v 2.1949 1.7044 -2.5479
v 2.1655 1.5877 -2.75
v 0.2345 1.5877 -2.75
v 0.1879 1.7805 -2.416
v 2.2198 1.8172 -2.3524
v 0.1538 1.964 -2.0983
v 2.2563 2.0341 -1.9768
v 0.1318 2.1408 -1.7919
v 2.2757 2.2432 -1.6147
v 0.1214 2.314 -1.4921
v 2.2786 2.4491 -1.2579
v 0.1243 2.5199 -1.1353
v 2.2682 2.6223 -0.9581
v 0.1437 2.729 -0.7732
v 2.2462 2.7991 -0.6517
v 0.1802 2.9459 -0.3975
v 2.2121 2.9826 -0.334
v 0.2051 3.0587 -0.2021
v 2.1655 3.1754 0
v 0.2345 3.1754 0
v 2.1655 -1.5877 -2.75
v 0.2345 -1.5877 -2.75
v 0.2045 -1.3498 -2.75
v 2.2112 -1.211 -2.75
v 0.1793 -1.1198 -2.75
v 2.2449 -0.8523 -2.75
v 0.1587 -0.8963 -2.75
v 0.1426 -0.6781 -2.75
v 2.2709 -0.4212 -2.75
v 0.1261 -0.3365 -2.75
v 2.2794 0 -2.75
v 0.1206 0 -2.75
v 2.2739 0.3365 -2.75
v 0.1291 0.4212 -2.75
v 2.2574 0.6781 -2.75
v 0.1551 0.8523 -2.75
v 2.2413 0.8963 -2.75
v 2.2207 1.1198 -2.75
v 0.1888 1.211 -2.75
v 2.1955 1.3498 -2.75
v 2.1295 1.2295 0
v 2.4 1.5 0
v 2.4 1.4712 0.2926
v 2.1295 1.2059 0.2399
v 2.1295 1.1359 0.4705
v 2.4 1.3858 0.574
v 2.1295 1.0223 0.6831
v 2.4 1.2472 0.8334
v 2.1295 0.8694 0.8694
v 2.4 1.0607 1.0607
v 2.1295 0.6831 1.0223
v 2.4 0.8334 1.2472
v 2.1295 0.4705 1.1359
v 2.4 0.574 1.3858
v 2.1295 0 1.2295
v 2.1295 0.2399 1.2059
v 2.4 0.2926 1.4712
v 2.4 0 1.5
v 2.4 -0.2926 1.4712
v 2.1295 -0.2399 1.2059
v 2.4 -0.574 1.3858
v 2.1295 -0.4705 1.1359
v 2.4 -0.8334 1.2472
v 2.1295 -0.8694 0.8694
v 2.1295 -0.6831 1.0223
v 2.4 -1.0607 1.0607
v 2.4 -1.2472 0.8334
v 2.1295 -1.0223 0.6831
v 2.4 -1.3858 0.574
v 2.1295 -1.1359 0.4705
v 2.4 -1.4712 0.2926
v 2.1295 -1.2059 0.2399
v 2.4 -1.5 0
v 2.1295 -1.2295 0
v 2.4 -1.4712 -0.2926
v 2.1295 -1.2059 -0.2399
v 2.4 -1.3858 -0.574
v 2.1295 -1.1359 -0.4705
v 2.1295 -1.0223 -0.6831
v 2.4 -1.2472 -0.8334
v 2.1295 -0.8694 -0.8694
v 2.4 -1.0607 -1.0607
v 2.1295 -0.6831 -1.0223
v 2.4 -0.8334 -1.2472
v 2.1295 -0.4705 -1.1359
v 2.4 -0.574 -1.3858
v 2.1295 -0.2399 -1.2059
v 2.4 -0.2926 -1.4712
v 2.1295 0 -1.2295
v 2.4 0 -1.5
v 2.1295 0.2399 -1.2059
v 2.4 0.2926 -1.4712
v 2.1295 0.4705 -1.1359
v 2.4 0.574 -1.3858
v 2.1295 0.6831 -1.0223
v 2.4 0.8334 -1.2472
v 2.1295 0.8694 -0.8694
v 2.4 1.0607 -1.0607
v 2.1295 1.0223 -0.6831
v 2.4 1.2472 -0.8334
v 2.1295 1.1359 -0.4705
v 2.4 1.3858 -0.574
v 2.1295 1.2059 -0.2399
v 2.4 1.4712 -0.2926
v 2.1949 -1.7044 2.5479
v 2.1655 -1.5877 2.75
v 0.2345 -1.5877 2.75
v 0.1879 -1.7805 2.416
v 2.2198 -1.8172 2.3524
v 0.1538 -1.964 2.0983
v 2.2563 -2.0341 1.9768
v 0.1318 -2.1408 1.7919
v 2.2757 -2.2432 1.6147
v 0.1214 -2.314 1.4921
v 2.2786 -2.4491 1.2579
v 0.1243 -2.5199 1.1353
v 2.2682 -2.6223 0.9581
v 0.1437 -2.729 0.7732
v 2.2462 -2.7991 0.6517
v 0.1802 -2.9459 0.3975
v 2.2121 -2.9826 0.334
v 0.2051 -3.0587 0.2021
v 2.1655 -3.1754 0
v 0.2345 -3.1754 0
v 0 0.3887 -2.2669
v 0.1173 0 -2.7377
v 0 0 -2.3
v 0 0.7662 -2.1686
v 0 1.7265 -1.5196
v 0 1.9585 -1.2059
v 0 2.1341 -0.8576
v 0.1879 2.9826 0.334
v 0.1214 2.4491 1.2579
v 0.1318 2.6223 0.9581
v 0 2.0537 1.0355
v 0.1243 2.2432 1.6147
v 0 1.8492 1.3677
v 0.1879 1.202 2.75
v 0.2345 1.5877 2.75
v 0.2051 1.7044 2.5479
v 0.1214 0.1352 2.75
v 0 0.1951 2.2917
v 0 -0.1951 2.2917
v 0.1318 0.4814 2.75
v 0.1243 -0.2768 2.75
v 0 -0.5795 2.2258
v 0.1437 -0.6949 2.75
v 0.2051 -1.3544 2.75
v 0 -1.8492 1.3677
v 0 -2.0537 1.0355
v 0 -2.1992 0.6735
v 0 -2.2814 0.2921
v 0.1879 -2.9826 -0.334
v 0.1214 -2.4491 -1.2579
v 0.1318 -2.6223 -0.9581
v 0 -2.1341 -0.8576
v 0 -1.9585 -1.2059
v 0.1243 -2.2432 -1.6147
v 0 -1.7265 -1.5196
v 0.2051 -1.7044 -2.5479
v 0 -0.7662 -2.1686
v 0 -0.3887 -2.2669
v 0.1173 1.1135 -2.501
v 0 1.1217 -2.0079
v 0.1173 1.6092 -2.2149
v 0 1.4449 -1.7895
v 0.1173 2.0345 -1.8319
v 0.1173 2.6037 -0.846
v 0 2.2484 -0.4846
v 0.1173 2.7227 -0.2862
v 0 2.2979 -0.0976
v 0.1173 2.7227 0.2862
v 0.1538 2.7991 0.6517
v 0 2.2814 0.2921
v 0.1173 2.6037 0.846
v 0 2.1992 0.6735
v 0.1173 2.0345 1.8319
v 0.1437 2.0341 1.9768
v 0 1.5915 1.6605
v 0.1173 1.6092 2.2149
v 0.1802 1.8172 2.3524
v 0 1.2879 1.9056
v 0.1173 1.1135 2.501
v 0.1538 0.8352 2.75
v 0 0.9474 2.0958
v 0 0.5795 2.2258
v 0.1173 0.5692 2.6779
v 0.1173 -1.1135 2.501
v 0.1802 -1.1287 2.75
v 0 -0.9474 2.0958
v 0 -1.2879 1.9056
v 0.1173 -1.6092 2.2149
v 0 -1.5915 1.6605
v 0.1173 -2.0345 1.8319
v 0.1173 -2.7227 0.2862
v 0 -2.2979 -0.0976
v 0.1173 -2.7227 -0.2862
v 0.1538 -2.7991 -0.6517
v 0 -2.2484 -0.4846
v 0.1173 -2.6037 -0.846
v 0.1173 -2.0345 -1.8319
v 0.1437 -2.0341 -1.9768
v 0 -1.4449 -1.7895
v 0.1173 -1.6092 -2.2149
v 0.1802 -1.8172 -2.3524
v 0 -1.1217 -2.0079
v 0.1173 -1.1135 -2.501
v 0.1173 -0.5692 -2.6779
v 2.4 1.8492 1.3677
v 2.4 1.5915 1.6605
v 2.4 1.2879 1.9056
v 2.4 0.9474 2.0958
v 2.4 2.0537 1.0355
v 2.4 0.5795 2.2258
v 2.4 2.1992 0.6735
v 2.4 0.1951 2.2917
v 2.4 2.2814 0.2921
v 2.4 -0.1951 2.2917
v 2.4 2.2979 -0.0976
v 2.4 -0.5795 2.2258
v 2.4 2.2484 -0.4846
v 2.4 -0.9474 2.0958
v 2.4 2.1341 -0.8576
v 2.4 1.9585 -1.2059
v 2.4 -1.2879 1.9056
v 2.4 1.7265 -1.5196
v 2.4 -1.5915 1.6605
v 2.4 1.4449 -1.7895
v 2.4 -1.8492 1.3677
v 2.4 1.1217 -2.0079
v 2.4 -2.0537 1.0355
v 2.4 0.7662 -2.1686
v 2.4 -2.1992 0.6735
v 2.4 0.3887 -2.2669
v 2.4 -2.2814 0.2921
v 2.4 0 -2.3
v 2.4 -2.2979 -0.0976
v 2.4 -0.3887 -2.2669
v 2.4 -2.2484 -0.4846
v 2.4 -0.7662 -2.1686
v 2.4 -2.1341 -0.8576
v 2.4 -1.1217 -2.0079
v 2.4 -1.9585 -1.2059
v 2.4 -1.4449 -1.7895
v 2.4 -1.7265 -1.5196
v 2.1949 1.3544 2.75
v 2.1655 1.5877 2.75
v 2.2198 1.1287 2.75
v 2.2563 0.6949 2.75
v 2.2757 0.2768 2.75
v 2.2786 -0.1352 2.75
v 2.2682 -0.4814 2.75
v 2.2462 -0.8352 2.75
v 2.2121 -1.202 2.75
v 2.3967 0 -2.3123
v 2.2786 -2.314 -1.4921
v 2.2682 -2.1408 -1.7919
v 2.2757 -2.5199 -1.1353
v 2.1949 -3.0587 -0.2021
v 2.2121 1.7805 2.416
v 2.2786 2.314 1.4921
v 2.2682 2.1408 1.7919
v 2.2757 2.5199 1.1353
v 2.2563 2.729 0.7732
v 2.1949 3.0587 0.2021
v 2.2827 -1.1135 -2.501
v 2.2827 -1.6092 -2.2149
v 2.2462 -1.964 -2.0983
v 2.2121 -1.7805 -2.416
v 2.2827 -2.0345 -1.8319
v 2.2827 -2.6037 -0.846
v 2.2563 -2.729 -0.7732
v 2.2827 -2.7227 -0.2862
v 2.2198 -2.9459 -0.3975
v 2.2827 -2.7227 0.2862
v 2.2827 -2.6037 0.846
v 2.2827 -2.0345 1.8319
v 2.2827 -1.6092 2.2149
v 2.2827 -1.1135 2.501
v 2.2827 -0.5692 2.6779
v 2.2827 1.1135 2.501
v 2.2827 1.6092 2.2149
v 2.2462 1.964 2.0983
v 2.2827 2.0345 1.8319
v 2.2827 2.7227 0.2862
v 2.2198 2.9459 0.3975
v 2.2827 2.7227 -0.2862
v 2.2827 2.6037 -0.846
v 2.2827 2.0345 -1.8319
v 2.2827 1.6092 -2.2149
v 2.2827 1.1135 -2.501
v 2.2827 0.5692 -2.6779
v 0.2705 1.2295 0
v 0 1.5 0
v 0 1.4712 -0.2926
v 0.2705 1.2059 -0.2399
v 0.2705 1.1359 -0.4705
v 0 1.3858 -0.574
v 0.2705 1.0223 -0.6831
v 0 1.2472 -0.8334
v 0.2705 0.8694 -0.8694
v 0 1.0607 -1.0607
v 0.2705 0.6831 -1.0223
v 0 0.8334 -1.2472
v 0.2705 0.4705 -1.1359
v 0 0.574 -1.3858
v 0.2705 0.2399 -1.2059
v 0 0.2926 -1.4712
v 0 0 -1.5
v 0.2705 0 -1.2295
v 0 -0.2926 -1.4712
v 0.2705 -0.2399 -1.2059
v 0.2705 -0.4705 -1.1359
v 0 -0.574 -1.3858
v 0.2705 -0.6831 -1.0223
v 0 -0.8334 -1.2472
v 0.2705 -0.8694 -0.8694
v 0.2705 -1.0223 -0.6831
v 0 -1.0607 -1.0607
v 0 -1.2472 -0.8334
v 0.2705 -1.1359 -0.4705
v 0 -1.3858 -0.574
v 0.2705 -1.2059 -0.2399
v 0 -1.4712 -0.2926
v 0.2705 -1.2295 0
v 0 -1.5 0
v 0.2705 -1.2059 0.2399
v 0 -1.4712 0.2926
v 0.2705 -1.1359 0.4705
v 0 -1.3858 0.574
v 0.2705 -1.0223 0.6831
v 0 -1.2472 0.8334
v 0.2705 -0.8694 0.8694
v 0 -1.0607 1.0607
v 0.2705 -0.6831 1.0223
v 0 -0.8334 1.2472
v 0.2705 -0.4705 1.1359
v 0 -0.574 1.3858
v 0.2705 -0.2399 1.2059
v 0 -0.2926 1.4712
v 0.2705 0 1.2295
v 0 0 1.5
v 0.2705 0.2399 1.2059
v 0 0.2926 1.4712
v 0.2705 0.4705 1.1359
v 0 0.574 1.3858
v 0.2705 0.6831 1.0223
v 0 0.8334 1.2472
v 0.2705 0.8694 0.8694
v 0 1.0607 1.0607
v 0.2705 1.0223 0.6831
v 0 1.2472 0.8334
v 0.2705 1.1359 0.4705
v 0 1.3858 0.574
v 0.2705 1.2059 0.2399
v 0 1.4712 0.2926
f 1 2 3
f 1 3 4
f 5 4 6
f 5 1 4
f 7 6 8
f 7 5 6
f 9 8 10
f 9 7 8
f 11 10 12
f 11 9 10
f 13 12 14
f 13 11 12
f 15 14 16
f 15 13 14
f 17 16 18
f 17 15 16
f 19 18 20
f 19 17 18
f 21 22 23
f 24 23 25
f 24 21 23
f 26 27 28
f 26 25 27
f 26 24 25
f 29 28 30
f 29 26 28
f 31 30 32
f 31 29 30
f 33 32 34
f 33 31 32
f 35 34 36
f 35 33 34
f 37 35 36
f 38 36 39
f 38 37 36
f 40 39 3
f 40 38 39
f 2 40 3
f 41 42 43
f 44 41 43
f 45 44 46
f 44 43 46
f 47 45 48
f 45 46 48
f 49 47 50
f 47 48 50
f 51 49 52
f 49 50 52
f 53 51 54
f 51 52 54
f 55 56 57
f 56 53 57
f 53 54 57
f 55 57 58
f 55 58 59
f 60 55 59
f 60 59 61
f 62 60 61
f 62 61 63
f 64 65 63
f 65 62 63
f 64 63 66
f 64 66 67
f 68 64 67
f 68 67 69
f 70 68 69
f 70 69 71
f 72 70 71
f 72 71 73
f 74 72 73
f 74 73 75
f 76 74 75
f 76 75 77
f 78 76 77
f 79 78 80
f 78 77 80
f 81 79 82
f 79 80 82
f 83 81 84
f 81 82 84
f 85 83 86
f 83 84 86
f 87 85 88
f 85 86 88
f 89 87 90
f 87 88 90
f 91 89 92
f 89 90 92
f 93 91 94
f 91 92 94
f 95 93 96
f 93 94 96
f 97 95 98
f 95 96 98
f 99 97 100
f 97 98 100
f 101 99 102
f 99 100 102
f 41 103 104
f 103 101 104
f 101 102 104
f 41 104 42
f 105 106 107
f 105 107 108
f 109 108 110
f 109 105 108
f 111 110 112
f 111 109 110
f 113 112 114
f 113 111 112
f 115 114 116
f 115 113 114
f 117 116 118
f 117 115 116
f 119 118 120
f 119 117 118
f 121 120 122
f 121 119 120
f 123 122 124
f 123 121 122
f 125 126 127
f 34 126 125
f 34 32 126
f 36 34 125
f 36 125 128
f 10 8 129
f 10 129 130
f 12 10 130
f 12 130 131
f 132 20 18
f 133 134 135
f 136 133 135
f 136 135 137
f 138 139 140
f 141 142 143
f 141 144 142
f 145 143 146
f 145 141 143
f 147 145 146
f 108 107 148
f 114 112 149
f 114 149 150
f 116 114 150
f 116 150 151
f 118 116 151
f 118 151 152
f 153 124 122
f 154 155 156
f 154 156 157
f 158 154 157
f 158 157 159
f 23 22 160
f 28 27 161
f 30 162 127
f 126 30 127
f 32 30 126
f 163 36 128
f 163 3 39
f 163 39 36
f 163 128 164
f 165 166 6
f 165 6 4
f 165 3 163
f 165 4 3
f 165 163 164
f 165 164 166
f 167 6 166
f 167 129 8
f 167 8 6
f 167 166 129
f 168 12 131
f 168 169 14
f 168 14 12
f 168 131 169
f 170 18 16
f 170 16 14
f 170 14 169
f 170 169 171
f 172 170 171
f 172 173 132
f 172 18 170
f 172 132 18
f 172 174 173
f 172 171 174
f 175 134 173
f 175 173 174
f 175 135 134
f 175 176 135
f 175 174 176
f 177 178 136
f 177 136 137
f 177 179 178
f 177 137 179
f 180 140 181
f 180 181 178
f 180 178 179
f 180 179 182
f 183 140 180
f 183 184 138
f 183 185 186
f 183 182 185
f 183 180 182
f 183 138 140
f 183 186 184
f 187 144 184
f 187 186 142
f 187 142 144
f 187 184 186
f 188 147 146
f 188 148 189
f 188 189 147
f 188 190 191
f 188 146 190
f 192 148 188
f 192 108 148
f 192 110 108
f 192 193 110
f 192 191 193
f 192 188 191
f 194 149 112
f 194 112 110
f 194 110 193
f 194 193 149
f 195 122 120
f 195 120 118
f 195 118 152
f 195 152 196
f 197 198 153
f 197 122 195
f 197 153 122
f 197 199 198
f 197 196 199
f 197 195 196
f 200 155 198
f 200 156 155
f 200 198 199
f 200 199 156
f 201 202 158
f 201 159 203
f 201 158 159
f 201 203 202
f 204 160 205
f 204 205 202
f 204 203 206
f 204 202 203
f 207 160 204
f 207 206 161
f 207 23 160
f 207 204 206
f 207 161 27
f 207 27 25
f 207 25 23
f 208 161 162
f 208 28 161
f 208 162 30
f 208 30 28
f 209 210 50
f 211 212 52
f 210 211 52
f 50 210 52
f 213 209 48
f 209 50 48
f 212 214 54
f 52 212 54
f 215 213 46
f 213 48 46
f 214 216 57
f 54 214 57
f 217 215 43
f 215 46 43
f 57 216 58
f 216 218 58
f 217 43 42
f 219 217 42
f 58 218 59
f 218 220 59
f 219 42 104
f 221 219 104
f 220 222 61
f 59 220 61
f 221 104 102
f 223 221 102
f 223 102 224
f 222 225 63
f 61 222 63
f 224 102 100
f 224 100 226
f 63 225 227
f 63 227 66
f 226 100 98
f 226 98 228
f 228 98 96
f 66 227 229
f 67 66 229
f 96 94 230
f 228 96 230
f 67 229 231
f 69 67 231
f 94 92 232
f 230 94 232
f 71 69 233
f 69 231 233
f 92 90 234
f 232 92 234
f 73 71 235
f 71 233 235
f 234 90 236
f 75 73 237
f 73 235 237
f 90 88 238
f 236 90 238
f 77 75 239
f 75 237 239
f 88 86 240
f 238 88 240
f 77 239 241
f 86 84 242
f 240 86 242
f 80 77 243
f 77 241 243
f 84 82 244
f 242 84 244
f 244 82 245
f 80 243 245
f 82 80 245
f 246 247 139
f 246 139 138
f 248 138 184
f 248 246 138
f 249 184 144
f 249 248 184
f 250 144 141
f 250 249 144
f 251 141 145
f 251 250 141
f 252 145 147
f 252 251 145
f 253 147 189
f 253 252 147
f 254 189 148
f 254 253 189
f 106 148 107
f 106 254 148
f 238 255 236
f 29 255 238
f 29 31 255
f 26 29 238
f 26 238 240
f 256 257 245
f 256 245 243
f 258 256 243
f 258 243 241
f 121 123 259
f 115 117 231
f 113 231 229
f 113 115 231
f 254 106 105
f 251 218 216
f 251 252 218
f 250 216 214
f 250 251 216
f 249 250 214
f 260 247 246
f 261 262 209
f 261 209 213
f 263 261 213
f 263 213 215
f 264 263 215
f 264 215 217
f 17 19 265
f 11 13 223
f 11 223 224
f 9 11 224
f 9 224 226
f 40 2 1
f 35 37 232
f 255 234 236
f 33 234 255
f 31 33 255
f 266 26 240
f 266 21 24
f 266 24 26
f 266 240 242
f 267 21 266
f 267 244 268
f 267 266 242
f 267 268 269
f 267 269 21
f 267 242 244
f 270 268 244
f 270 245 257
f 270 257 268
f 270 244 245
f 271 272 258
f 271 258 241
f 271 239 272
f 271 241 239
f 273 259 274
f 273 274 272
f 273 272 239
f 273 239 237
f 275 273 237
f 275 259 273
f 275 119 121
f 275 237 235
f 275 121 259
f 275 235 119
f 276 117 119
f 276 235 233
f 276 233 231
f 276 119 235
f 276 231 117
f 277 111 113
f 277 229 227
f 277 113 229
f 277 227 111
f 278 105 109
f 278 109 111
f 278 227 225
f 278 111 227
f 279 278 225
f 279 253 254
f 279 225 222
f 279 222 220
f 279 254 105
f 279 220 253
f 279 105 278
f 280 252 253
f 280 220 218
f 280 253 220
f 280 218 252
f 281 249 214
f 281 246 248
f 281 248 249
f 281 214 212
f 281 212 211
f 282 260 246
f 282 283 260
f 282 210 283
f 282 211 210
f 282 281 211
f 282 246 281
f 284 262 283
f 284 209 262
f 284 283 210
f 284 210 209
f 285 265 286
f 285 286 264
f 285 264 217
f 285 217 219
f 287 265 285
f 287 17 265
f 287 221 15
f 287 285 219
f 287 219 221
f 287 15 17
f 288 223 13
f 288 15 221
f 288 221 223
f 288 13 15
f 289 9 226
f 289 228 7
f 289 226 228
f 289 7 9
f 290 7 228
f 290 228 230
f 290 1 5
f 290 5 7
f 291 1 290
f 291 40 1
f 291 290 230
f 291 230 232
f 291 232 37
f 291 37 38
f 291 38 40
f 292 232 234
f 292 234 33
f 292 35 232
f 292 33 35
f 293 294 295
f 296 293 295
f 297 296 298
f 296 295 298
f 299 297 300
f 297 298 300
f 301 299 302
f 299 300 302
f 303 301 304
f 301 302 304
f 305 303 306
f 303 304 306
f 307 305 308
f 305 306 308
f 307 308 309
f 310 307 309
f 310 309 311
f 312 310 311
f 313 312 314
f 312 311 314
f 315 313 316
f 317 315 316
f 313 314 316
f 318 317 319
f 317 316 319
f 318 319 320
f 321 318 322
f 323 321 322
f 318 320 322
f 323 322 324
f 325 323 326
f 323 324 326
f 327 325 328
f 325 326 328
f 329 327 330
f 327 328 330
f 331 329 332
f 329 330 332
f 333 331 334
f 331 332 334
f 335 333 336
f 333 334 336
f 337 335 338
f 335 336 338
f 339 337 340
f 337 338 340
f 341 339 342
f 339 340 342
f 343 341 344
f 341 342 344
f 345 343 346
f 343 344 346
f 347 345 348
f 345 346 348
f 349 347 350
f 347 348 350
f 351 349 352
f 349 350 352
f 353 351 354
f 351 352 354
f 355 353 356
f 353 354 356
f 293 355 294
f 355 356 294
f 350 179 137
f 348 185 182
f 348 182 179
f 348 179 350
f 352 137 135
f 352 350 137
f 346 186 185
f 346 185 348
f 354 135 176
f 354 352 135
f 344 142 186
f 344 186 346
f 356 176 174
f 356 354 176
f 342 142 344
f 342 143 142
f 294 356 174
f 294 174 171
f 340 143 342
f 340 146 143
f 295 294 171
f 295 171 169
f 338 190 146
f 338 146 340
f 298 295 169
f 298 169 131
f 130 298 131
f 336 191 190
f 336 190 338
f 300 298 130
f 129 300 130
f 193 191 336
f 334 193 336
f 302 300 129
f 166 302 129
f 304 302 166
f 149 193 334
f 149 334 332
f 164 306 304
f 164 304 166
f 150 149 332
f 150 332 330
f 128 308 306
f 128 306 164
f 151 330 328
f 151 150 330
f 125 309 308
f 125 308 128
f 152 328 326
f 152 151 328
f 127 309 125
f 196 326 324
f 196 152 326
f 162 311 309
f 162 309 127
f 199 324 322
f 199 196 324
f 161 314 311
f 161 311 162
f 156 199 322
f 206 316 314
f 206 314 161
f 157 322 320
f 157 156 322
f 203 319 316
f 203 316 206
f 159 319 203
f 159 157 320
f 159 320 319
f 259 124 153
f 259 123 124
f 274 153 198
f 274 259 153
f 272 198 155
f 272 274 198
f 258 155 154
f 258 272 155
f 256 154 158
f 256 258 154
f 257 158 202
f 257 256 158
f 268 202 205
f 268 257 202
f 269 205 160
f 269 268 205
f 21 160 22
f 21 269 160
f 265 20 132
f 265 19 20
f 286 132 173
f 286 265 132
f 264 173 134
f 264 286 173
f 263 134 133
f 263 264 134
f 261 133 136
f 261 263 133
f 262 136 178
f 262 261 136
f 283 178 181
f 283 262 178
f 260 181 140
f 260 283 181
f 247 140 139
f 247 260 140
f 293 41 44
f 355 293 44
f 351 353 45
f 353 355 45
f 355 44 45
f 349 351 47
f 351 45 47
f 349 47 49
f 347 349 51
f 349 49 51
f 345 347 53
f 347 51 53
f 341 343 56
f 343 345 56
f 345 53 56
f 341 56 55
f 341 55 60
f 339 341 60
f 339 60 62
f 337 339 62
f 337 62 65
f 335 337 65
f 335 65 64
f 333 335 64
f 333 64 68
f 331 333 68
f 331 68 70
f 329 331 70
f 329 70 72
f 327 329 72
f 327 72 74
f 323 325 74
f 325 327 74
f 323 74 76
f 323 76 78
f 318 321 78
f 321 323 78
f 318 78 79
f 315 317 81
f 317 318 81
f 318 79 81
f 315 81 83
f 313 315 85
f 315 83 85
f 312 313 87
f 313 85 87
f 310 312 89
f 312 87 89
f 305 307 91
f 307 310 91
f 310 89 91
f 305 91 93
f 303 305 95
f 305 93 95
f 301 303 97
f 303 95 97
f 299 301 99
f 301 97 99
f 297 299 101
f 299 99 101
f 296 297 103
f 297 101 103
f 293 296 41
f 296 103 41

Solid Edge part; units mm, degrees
sketch "Sketch1" plane through (0, 0, 0) normal (0, -1, 0) x (1, 0, 0)
  line L0 (0, 0) -> (0, -2.3)
  line L1 (0, -2.3) -> (0.2679, -3.3)
  line L2 (0.2679, -3.3) -> (2.1321, -3.3)
  line L3 (2.1321, -3.3) -> (2.4, -2.3)
  line L4 (2.4, -2.3) -> (2.4, 0)
  line L5 (2.4, 0) -> (0, 0)
revolve "RevolvedProtrusion1" add sketch "Sketch1" angle 360 about axis through (2.4, 0, 0) along (-1, 0, 0)
sketch "Sketch2" plane through (0, 0, 0) normal (1, 0, 0) x (0, 1, 0)
  line L0 (11, 11) -> (-11, 11)
  line L1 (-11, 11) -> (-11, -11)
  line L2 (-11, -11) -> (11, -11)
  line L3 (11, -11) -> (11, 11)
  line L4 (1.5877, 2.75) -> (-1.5877, 2.75)
  line L5 (-1.5877, 2.75) -> (-3.1754, 0)
  line L6 (-3.1754, 0) -> (-1.5877, -2.75)
  line L7 (-1.5877, -2.75) -> (1.5877, -2.75)
  line L8 (1.5877, -2.75) -> (3.1754, 0)
  line L9 (3.1754, 0) -> (1.5877, 2.75)
extrude "ExtrudedCutout_1" cut sketch "Sketch2" against normal blind 3.4 and the other way blind 3.4
sketch "Sketch3" plane through (0, 0, 0) normal (0, 0, 1) x (1, 0, 0)
  line L0 (0, 0) -> (0, 1.5)
  line L1 (0, 1.5) -> (0.2705, 1.2295)
  line L2 (0.2705, 1.2295) -> (2.1295, 1.2295)
  line L3 (2.1295, 1.2295) -> (2.4, 1.5)
  line L4 (2.4, 1.5) -> (2.4, 0)
  line L5 (2.4, 0) -> (0, 0)
revolve "RevolvedCutout1" cut sketch "Sketch3" angle 360 about axis through (2.4, 0, 0) along (-1, 0, 0)
cosmetic_thread "Thread1" size "M3"
properties part number "Hexagon nut - style 1 JIS B 1181 M3"
